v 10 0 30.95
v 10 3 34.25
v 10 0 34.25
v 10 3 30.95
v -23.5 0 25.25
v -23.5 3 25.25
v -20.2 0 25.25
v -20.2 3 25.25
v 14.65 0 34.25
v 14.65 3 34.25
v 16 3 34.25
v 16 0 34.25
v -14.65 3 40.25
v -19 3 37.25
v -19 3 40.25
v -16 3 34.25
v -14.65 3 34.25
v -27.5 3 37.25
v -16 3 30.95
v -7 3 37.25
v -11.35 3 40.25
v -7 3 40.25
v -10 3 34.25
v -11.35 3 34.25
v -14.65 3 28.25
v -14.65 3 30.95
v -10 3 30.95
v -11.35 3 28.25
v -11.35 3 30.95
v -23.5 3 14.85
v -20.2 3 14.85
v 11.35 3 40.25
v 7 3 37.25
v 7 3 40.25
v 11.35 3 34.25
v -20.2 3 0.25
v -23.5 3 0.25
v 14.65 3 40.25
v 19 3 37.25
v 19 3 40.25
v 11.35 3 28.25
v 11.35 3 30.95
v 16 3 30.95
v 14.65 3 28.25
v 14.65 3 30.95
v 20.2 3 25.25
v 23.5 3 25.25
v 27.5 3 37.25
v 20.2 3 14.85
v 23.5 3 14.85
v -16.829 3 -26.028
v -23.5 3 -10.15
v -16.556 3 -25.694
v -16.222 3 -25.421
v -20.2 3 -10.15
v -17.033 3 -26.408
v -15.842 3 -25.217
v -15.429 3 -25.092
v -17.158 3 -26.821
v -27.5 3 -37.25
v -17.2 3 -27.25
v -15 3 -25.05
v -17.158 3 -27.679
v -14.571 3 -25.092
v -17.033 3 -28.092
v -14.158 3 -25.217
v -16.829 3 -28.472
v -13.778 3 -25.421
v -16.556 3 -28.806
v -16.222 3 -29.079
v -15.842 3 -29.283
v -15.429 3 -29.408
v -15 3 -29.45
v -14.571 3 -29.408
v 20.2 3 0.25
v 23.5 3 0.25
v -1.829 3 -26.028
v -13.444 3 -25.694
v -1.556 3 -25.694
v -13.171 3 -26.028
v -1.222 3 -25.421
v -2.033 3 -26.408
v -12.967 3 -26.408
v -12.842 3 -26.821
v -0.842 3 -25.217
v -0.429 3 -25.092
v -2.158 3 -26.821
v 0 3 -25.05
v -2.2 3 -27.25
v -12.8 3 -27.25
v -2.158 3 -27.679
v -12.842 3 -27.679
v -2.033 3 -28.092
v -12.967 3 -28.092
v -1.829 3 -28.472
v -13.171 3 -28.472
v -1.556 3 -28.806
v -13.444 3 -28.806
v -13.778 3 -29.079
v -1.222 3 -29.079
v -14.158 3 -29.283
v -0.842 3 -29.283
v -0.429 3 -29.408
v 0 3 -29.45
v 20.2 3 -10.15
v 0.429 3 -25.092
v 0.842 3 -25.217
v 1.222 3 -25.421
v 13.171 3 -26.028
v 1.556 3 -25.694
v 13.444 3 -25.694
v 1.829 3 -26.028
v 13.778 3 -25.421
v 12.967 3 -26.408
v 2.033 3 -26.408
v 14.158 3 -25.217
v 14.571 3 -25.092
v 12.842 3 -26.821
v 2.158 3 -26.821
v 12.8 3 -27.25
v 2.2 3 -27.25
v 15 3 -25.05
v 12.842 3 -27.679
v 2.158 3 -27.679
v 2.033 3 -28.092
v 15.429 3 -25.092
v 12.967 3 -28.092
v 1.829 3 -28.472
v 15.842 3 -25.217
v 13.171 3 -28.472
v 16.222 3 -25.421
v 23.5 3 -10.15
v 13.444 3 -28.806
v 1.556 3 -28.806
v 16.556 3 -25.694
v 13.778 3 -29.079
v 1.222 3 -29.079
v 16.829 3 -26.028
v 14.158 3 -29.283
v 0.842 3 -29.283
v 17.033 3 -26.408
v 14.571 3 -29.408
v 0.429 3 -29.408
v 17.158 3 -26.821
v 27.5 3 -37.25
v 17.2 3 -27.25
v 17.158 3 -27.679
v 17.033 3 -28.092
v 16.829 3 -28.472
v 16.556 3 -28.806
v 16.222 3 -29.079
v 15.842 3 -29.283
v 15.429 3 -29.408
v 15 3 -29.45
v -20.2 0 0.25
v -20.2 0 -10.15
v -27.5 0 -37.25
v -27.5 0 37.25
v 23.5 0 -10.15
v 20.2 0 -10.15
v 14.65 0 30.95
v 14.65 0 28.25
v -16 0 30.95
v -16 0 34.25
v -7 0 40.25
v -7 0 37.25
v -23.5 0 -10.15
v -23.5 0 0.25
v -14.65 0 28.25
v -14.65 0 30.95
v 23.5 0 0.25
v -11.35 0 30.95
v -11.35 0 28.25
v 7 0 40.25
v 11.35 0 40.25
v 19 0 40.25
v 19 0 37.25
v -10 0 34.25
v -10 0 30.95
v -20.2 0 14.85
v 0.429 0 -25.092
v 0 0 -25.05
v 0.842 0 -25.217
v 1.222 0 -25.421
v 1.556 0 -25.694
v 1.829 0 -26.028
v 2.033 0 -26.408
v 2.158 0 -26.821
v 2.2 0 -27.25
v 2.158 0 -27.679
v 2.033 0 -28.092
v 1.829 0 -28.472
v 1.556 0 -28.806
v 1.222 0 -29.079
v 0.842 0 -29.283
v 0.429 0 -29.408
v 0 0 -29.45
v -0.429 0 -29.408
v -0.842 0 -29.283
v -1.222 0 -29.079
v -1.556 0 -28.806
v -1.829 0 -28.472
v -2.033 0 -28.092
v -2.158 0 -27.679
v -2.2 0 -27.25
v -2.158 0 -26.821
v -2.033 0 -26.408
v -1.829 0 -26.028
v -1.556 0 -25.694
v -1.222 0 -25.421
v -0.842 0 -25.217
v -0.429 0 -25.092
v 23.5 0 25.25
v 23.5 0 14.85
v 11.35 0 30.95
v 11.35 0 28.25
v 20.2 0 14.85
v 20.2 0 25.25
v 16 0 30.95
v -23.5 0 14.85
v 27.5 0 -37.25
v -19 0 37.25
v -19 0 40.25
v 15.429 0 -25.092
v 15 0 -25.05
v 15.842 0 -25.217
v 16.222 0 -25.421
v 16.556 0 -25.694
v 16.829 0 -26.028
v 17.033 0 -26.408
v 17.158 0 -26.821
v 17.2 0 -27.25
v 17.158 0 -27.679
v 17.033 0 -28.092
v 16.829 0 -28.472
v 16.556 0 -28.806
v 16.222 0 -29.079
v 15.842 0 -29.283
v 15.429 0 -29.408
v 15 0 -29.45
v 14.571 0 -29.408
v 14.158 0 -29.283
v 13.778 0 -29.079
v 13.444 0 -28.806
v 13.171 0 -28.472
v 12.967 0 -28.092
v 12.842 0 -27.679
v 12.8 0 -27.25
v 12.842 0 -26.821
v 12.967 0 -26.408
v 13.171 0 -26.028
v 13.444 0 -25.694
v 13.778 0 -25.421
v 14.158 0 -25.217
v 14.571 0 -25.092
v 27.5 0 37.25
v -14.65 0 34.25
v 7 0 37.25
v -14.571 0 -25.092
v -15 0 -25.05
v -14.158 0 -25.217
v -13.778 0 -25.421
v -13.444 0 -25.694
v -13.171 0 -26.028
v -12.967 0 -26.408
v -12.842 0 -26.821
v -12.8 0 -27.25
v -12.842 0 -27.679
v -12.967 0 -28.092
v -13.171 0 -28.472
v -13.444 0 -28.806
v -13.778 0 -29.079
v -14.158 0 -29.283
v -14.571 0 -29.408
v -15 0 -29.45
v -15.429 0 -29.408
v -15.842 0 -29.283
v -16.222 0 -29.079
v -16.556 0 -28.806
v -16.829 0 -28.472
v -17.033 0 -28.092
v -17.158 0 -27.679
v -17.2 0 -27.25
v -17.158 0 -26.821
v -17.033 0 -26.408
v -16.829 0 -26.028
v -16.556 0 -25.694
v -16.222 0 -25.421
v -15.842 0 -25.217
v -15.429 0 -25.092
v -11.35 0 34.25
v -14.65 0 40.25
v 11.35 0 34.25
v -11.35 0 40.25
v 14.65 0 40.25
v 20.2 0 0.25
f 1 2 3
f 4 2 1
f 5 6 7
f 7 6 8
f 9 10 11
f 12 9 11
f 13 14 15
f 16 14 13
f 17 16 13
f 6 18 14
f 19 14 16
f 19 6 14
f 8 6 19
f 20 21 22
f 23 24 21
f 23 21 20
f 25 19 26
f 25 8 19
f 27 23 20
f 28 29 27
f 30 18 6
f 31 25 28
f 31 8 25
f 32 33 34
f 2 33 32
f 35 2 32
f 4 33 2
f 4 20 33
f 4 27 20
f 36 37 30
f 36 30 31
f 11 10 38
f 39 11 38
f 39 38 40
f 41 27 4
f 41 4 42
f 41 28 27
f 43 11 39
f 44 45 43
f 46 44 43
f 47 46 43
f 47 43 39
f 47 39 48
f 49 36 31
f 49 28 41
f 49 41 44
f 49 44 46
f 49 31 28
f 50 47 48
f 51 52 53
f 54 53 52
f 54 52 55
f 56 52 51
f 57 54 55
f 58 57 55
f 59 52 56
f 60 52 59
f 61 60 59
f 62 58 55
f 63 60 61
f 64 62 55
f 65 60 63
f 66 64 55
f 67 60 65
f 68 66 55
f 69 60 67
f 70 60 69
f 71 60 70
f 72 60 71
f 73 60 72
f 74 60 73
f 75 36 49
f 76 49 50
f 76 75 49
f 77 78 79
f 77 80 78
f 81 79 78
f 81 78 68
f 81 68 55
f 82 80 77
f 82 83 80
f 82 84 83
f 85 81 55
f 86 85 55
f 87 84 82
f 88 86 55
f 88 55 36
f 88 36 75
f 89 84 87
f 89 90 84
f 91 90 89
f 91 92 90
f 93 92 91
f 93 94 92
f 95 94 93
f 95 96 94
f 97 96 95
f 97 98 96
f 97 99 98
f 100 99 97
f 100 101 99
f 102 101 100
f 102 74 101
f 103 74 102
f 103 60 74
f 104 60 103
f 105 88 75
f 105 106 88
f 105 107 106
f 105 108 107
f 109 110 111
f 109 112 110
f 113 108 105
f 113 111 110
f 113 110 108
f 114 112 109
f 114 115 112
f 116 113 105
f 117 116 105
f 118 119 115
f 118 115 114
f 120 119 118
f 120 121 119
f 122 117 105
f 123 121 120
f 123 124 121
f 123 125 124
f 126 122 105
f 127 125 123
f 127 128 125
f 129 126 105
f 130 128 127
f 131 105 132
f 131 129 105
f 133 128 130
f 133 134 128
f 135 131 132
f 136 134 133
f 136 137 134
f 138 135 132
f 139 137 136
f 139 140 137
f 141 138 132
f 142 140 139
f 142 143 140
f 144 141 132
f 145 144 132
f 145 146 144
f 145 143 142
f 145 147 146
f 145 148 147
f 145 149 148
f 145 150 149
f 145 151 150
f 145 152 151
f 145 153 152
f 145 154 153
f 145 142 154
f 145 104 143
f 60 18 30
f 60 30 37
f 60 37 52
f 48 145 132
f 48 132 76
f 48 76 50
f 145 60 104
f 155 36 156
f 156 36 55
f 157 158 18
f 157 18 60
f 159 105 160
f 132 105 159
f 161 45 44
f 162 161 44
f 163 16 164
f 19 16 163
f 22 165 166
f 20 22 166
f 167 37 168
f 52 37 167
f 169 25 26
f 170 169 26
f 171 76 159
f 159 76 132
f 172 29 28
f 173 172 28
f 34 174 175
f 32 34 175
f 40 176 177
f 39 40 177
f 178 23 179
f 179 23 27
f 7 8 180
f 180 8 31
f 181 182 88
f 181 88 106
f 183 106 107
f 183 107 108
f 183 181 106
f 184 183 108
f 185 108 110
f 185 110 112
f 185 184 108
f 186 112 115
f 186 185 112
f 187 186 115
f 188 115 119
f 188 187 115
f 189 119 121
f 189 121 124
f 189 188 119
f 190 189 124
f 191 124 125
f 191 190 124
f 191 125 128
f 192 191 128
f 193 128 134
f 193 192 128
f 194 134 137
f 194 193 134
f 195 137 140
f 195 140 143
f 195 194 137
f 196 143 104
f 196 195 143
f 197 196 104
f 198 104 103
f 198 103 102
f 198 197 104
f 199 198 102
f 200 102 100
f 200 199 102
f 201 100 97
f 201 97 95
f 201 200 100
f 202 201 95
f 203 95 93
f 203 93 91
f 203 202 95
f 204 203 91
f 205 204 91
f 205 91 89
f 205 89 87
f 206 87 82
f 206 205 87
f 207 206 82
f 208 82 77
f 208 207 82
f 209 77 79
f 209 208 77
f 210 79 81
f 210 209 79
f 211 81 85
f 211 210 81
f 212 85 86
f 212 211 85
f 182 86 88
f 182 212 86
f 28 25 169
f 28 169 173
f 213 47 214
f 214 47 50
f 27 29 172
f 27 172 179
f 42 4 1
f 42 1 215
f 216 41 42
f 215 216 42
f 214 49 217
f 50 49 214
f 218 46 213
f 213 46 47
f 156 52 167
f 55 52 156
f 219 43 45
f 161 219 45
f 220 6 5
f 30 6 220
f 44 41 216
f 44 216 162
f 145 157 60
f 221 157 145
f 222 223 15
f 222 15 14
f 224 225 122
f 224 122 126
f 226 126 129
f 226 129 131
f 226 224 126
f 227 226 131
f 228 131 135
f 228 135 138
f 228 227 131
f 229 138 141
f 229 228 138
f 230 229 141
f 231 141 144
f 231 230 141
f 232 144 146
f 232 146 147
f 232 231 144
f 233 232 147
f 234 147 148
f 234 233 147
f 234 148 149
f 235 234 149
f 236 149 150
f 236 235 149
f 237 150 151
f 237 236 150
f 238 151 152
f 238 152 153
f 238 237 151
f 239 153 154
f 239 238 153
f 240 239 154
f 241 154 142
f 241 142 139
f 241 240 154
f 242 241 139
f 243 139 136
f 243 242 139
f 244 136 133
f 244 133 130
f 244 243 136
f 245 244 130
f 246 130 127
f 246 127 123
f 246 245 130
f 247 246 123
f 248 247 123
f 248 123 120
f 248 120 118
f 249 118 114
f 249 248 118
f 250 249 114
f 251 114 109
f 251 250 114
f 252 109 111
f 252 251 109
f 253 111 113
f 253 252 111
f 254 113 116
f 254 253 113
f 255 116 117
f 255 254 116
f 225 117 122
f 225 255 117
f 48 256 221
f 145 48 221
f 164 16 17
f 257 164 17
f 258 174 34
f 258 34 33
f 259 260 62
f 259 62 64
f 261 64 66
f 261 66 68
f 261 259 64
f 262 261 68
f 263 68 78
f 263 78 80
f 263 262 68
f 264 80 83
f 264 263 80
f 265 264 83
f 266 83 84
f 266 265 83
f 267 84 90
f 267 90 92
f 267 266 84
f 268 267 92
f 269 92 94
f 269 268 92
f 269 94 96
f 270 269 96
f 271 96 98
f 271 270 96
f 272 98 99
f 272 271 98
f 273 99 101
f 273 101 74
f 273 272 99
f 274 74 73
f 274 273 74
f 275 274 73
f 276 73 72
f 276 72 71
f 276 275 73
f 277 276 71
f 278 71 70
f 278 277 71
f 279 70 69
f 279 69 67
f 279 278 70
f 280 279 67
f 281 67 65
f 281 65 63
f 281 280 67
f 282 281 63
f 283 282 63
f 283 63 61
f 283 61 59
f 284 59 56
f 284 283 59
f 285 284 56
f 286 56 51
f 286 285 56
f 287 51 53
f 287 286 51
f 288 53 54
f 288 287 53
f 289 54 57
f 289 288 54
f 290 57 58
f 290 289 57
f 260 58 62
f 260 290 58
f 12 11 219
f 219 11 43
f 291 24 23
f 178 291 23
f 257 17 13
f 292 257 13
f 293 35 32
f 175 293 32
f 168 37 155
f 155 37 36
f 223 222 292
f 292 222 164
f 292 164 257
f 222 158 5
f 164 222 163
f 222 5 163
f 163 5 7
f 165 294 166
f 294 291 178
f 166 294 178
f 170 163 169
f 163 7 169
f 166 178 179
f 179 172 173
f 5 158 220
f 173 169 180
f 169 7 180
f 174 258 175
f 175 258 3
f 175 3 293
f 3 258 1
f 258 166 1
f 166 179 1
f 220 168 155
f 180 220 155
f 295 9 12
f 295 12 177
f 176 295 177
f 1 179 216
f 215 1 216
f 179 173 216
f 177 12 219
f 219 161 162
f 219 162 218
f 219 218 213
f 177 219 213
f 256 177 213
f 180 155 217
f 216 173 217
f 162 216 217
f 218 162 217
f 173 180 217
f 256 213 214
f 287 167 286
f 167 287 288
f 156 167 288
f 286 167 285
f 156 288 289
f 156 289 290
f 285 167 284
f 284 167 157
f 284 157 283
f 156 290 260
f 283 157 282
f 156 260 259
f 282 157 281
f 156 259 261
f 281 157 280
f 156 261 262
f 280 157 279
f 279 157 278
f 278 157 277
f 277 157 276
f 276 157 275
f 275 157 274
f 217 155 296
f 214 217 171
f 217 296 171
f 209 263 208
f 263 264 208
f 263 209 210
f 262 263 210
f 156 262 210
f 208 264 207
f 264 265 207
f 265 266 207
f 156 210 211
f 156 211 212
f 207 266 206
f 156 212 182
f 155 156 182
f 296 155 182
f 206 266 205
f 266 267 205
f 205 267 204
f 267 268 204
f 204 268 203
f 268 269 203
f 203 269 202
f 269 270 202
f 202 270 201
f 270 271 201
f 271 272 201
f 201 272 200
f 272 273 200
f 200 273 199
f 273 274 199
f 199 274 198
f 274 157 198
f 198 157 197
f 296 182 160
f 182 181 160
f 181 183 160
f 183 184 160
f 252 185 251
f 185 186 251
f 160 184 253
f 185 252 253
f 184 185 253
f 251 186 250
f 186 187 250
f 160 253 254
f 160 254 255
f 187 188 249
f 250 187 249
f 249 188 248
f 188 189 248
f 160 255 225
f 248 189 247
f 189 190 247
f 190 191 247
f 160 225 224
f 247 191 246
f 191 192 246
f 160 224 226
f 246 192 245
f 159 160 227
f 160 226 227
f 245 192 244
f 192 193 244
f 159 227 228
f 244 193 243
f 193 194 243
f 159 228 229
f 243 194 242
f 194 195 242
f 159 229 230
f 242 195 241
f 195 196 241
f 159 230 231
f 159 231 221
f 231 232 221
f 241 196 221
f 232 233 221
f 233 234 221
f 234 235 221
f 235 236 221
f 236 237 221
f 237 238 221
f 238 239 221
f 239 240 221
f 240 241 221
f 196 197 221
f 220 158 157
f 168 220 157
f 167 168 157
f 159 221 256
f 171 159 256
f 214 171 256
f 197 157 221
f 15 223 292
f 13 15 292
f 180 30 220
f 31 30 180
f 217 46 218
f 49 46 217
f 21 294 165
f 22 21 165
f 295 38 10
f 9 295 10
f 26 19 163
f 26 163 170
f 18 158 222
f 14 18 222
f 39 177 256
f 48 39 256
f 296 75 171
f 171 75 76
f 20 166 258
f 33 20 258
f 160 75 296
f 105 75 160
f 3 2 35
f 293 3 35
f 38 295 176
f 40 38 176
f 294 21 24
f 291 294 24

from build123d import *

# Parameters (mm, degrees)
SKETCH_1_W             = 55
SKETCH_1_H             = 74.5
SKETCH_1_R             = 2.2
SKETCH_1_W_2           = 12
SKETCH_1_H_2           = 3
EXTRUDE_1_DEPTH        = 3
SKETCH_2_W             = 3.3
SKETCH_2_H             = 10.4
CUT_EXTRUDE_1_DEPTH    = 3
SKETCH_3_W             = 1.35
SKETCH_3_H             = 3.3
SKETCH_3_W_2           = 3.3
SKETCH_3_H_2           = 2.7
SKETCH_3_H_3           = 6
CUT_EXTRUDE_2_DEPTH    = 3
PATTERN_LINEAR_1_COUNT = 2
PATTERN_LINEAR_1_PITCH = 25


with BuildPart() as part:
    # 草图1 → 凸台-拉伸1 (new body)
    # profile 1 of 3: a face of its own
    with BuildSketch(Plane(origin=(0, 0, 0), x_dir=(1, 0, 0), z_dir=(0, 1, 0))):
        Rectangle(SKETCH_1_W, SKETCH_1_H)
        with Locations(Location((0, 27.25, 0), (0, 0, 270))):
            Circle(SKETCH_1_R, mode=Mode.SUBTRACT)
        with Locations(Location((-15, 27.25, 0), (0, 0, 270))):
            Circle(SKETCH_1_R, mode=Mode.SUBTRACT)
        with Locations(Location((15, 27.25, 0), (0, 0, 270))):
            Circle(SKETCH_1_R, mode=Mode.SUBTRACT)
    # profile 2 of 3: a face of its own
    with BuildSketch(Plane(origin=(0, 0, 0), x_dir=(1, 0, 0), z_dir=(0, 1, 0))):
        with Locations((-13, -38.75)):
            Rectangle(SKETCH_1_W_2, SKETCH_1_H_2)
    # profile 3 of 3: a face of its own
    with BuildSketch(Plane(origin=(0, 0, 0), x_dir=(1, 0, 0), z_dir=(0, 1, 0))):
        with Locations((13, -38.75)):
            Rectangle(SKETCH_1_W_2, SKETCH_1_H_2)
    extrude(amount=EXTRUDE_1_DEPTH)

    # 草图2 → 切除-拉伸1 (cut)
    with BuildSketch(Plane(origin=(0, 3, 0), x_dir=(1, 0, 0), z_dir=(0, 1, 0))):
        with Locations((-21.85, -20.05)):
            Rectangle(SKETCH_2_W, SKETCH_2_H)
        with Locations((21.85, -20.05)):
            Rectangle(SKETCH_2_W, SKETCH_2_H)
    cut_extrude_1 = extrude(amount=-CUT_EXTRUDE_1_DEPTH, mode=Mode.SUBTRACT)

    # 草图3 → 切除-拉伸2 (cut)
    with BuildSketch(Plane(origin=(0, 3, 0), x_dir=(1, 0, 0), z_dir=(0, 1, 0))):
        with Locations((-10.675, -32.6)):
            Rectangle(SKETCH_3_W, SKETCH_3_H)
        with Locations((-13, -29.6)):
            Rectangle(SKETCH_3_W_2, SKETCH_3_H_2)
        with Locations((-13, -32.6)):
            Rectangle(SKETCH_3_W_2, SKETCH_3_H)
        with Locations((-13, -37.25)):
            Rectangle(SKETCH_3_W_2, SKETCH_3_H_3)
        with Locations((-15.325, -32.6)):
            Rectangle(SKETCH_3_W, SKETCH_3_H)
        with Locations((13, -37.25)):
            Rectangle(SKETCH_3_W_2, SKETCH_3_H_3)
        with Locations((15.325, -32.6)):
            Rectangle(SKETCH_3_W, SKETCH_3_H)
        with Locations((13, -32.6)):
            Rectangle(SKETCH_3_W_2, SKETCH_3_H)
        with Locations((13, -29.6)):
            Rectangle(SKETCH_3_W_2, SKETCH_3_H_2)
        with Locations((10.675, -32.6)):
            Rectangle(SKETCH_3_W, SKETCH_3_H)
    extrude(amount=-CUT_EXTRUDE_2_DEPTH, mode=Mode.SUBTRACT)

    # 阵列(线性)1: 切除-拉伸1 ×2
    with Locations(*[(0, 0, -i * PATTERN_LINEAR_1_PITCH) for i in range(1, PATTERN_LINEAR_1_COUNT)]):
        add(cut_extrude_1, mode=Mode.SUBTRACT)


solid = part.part
